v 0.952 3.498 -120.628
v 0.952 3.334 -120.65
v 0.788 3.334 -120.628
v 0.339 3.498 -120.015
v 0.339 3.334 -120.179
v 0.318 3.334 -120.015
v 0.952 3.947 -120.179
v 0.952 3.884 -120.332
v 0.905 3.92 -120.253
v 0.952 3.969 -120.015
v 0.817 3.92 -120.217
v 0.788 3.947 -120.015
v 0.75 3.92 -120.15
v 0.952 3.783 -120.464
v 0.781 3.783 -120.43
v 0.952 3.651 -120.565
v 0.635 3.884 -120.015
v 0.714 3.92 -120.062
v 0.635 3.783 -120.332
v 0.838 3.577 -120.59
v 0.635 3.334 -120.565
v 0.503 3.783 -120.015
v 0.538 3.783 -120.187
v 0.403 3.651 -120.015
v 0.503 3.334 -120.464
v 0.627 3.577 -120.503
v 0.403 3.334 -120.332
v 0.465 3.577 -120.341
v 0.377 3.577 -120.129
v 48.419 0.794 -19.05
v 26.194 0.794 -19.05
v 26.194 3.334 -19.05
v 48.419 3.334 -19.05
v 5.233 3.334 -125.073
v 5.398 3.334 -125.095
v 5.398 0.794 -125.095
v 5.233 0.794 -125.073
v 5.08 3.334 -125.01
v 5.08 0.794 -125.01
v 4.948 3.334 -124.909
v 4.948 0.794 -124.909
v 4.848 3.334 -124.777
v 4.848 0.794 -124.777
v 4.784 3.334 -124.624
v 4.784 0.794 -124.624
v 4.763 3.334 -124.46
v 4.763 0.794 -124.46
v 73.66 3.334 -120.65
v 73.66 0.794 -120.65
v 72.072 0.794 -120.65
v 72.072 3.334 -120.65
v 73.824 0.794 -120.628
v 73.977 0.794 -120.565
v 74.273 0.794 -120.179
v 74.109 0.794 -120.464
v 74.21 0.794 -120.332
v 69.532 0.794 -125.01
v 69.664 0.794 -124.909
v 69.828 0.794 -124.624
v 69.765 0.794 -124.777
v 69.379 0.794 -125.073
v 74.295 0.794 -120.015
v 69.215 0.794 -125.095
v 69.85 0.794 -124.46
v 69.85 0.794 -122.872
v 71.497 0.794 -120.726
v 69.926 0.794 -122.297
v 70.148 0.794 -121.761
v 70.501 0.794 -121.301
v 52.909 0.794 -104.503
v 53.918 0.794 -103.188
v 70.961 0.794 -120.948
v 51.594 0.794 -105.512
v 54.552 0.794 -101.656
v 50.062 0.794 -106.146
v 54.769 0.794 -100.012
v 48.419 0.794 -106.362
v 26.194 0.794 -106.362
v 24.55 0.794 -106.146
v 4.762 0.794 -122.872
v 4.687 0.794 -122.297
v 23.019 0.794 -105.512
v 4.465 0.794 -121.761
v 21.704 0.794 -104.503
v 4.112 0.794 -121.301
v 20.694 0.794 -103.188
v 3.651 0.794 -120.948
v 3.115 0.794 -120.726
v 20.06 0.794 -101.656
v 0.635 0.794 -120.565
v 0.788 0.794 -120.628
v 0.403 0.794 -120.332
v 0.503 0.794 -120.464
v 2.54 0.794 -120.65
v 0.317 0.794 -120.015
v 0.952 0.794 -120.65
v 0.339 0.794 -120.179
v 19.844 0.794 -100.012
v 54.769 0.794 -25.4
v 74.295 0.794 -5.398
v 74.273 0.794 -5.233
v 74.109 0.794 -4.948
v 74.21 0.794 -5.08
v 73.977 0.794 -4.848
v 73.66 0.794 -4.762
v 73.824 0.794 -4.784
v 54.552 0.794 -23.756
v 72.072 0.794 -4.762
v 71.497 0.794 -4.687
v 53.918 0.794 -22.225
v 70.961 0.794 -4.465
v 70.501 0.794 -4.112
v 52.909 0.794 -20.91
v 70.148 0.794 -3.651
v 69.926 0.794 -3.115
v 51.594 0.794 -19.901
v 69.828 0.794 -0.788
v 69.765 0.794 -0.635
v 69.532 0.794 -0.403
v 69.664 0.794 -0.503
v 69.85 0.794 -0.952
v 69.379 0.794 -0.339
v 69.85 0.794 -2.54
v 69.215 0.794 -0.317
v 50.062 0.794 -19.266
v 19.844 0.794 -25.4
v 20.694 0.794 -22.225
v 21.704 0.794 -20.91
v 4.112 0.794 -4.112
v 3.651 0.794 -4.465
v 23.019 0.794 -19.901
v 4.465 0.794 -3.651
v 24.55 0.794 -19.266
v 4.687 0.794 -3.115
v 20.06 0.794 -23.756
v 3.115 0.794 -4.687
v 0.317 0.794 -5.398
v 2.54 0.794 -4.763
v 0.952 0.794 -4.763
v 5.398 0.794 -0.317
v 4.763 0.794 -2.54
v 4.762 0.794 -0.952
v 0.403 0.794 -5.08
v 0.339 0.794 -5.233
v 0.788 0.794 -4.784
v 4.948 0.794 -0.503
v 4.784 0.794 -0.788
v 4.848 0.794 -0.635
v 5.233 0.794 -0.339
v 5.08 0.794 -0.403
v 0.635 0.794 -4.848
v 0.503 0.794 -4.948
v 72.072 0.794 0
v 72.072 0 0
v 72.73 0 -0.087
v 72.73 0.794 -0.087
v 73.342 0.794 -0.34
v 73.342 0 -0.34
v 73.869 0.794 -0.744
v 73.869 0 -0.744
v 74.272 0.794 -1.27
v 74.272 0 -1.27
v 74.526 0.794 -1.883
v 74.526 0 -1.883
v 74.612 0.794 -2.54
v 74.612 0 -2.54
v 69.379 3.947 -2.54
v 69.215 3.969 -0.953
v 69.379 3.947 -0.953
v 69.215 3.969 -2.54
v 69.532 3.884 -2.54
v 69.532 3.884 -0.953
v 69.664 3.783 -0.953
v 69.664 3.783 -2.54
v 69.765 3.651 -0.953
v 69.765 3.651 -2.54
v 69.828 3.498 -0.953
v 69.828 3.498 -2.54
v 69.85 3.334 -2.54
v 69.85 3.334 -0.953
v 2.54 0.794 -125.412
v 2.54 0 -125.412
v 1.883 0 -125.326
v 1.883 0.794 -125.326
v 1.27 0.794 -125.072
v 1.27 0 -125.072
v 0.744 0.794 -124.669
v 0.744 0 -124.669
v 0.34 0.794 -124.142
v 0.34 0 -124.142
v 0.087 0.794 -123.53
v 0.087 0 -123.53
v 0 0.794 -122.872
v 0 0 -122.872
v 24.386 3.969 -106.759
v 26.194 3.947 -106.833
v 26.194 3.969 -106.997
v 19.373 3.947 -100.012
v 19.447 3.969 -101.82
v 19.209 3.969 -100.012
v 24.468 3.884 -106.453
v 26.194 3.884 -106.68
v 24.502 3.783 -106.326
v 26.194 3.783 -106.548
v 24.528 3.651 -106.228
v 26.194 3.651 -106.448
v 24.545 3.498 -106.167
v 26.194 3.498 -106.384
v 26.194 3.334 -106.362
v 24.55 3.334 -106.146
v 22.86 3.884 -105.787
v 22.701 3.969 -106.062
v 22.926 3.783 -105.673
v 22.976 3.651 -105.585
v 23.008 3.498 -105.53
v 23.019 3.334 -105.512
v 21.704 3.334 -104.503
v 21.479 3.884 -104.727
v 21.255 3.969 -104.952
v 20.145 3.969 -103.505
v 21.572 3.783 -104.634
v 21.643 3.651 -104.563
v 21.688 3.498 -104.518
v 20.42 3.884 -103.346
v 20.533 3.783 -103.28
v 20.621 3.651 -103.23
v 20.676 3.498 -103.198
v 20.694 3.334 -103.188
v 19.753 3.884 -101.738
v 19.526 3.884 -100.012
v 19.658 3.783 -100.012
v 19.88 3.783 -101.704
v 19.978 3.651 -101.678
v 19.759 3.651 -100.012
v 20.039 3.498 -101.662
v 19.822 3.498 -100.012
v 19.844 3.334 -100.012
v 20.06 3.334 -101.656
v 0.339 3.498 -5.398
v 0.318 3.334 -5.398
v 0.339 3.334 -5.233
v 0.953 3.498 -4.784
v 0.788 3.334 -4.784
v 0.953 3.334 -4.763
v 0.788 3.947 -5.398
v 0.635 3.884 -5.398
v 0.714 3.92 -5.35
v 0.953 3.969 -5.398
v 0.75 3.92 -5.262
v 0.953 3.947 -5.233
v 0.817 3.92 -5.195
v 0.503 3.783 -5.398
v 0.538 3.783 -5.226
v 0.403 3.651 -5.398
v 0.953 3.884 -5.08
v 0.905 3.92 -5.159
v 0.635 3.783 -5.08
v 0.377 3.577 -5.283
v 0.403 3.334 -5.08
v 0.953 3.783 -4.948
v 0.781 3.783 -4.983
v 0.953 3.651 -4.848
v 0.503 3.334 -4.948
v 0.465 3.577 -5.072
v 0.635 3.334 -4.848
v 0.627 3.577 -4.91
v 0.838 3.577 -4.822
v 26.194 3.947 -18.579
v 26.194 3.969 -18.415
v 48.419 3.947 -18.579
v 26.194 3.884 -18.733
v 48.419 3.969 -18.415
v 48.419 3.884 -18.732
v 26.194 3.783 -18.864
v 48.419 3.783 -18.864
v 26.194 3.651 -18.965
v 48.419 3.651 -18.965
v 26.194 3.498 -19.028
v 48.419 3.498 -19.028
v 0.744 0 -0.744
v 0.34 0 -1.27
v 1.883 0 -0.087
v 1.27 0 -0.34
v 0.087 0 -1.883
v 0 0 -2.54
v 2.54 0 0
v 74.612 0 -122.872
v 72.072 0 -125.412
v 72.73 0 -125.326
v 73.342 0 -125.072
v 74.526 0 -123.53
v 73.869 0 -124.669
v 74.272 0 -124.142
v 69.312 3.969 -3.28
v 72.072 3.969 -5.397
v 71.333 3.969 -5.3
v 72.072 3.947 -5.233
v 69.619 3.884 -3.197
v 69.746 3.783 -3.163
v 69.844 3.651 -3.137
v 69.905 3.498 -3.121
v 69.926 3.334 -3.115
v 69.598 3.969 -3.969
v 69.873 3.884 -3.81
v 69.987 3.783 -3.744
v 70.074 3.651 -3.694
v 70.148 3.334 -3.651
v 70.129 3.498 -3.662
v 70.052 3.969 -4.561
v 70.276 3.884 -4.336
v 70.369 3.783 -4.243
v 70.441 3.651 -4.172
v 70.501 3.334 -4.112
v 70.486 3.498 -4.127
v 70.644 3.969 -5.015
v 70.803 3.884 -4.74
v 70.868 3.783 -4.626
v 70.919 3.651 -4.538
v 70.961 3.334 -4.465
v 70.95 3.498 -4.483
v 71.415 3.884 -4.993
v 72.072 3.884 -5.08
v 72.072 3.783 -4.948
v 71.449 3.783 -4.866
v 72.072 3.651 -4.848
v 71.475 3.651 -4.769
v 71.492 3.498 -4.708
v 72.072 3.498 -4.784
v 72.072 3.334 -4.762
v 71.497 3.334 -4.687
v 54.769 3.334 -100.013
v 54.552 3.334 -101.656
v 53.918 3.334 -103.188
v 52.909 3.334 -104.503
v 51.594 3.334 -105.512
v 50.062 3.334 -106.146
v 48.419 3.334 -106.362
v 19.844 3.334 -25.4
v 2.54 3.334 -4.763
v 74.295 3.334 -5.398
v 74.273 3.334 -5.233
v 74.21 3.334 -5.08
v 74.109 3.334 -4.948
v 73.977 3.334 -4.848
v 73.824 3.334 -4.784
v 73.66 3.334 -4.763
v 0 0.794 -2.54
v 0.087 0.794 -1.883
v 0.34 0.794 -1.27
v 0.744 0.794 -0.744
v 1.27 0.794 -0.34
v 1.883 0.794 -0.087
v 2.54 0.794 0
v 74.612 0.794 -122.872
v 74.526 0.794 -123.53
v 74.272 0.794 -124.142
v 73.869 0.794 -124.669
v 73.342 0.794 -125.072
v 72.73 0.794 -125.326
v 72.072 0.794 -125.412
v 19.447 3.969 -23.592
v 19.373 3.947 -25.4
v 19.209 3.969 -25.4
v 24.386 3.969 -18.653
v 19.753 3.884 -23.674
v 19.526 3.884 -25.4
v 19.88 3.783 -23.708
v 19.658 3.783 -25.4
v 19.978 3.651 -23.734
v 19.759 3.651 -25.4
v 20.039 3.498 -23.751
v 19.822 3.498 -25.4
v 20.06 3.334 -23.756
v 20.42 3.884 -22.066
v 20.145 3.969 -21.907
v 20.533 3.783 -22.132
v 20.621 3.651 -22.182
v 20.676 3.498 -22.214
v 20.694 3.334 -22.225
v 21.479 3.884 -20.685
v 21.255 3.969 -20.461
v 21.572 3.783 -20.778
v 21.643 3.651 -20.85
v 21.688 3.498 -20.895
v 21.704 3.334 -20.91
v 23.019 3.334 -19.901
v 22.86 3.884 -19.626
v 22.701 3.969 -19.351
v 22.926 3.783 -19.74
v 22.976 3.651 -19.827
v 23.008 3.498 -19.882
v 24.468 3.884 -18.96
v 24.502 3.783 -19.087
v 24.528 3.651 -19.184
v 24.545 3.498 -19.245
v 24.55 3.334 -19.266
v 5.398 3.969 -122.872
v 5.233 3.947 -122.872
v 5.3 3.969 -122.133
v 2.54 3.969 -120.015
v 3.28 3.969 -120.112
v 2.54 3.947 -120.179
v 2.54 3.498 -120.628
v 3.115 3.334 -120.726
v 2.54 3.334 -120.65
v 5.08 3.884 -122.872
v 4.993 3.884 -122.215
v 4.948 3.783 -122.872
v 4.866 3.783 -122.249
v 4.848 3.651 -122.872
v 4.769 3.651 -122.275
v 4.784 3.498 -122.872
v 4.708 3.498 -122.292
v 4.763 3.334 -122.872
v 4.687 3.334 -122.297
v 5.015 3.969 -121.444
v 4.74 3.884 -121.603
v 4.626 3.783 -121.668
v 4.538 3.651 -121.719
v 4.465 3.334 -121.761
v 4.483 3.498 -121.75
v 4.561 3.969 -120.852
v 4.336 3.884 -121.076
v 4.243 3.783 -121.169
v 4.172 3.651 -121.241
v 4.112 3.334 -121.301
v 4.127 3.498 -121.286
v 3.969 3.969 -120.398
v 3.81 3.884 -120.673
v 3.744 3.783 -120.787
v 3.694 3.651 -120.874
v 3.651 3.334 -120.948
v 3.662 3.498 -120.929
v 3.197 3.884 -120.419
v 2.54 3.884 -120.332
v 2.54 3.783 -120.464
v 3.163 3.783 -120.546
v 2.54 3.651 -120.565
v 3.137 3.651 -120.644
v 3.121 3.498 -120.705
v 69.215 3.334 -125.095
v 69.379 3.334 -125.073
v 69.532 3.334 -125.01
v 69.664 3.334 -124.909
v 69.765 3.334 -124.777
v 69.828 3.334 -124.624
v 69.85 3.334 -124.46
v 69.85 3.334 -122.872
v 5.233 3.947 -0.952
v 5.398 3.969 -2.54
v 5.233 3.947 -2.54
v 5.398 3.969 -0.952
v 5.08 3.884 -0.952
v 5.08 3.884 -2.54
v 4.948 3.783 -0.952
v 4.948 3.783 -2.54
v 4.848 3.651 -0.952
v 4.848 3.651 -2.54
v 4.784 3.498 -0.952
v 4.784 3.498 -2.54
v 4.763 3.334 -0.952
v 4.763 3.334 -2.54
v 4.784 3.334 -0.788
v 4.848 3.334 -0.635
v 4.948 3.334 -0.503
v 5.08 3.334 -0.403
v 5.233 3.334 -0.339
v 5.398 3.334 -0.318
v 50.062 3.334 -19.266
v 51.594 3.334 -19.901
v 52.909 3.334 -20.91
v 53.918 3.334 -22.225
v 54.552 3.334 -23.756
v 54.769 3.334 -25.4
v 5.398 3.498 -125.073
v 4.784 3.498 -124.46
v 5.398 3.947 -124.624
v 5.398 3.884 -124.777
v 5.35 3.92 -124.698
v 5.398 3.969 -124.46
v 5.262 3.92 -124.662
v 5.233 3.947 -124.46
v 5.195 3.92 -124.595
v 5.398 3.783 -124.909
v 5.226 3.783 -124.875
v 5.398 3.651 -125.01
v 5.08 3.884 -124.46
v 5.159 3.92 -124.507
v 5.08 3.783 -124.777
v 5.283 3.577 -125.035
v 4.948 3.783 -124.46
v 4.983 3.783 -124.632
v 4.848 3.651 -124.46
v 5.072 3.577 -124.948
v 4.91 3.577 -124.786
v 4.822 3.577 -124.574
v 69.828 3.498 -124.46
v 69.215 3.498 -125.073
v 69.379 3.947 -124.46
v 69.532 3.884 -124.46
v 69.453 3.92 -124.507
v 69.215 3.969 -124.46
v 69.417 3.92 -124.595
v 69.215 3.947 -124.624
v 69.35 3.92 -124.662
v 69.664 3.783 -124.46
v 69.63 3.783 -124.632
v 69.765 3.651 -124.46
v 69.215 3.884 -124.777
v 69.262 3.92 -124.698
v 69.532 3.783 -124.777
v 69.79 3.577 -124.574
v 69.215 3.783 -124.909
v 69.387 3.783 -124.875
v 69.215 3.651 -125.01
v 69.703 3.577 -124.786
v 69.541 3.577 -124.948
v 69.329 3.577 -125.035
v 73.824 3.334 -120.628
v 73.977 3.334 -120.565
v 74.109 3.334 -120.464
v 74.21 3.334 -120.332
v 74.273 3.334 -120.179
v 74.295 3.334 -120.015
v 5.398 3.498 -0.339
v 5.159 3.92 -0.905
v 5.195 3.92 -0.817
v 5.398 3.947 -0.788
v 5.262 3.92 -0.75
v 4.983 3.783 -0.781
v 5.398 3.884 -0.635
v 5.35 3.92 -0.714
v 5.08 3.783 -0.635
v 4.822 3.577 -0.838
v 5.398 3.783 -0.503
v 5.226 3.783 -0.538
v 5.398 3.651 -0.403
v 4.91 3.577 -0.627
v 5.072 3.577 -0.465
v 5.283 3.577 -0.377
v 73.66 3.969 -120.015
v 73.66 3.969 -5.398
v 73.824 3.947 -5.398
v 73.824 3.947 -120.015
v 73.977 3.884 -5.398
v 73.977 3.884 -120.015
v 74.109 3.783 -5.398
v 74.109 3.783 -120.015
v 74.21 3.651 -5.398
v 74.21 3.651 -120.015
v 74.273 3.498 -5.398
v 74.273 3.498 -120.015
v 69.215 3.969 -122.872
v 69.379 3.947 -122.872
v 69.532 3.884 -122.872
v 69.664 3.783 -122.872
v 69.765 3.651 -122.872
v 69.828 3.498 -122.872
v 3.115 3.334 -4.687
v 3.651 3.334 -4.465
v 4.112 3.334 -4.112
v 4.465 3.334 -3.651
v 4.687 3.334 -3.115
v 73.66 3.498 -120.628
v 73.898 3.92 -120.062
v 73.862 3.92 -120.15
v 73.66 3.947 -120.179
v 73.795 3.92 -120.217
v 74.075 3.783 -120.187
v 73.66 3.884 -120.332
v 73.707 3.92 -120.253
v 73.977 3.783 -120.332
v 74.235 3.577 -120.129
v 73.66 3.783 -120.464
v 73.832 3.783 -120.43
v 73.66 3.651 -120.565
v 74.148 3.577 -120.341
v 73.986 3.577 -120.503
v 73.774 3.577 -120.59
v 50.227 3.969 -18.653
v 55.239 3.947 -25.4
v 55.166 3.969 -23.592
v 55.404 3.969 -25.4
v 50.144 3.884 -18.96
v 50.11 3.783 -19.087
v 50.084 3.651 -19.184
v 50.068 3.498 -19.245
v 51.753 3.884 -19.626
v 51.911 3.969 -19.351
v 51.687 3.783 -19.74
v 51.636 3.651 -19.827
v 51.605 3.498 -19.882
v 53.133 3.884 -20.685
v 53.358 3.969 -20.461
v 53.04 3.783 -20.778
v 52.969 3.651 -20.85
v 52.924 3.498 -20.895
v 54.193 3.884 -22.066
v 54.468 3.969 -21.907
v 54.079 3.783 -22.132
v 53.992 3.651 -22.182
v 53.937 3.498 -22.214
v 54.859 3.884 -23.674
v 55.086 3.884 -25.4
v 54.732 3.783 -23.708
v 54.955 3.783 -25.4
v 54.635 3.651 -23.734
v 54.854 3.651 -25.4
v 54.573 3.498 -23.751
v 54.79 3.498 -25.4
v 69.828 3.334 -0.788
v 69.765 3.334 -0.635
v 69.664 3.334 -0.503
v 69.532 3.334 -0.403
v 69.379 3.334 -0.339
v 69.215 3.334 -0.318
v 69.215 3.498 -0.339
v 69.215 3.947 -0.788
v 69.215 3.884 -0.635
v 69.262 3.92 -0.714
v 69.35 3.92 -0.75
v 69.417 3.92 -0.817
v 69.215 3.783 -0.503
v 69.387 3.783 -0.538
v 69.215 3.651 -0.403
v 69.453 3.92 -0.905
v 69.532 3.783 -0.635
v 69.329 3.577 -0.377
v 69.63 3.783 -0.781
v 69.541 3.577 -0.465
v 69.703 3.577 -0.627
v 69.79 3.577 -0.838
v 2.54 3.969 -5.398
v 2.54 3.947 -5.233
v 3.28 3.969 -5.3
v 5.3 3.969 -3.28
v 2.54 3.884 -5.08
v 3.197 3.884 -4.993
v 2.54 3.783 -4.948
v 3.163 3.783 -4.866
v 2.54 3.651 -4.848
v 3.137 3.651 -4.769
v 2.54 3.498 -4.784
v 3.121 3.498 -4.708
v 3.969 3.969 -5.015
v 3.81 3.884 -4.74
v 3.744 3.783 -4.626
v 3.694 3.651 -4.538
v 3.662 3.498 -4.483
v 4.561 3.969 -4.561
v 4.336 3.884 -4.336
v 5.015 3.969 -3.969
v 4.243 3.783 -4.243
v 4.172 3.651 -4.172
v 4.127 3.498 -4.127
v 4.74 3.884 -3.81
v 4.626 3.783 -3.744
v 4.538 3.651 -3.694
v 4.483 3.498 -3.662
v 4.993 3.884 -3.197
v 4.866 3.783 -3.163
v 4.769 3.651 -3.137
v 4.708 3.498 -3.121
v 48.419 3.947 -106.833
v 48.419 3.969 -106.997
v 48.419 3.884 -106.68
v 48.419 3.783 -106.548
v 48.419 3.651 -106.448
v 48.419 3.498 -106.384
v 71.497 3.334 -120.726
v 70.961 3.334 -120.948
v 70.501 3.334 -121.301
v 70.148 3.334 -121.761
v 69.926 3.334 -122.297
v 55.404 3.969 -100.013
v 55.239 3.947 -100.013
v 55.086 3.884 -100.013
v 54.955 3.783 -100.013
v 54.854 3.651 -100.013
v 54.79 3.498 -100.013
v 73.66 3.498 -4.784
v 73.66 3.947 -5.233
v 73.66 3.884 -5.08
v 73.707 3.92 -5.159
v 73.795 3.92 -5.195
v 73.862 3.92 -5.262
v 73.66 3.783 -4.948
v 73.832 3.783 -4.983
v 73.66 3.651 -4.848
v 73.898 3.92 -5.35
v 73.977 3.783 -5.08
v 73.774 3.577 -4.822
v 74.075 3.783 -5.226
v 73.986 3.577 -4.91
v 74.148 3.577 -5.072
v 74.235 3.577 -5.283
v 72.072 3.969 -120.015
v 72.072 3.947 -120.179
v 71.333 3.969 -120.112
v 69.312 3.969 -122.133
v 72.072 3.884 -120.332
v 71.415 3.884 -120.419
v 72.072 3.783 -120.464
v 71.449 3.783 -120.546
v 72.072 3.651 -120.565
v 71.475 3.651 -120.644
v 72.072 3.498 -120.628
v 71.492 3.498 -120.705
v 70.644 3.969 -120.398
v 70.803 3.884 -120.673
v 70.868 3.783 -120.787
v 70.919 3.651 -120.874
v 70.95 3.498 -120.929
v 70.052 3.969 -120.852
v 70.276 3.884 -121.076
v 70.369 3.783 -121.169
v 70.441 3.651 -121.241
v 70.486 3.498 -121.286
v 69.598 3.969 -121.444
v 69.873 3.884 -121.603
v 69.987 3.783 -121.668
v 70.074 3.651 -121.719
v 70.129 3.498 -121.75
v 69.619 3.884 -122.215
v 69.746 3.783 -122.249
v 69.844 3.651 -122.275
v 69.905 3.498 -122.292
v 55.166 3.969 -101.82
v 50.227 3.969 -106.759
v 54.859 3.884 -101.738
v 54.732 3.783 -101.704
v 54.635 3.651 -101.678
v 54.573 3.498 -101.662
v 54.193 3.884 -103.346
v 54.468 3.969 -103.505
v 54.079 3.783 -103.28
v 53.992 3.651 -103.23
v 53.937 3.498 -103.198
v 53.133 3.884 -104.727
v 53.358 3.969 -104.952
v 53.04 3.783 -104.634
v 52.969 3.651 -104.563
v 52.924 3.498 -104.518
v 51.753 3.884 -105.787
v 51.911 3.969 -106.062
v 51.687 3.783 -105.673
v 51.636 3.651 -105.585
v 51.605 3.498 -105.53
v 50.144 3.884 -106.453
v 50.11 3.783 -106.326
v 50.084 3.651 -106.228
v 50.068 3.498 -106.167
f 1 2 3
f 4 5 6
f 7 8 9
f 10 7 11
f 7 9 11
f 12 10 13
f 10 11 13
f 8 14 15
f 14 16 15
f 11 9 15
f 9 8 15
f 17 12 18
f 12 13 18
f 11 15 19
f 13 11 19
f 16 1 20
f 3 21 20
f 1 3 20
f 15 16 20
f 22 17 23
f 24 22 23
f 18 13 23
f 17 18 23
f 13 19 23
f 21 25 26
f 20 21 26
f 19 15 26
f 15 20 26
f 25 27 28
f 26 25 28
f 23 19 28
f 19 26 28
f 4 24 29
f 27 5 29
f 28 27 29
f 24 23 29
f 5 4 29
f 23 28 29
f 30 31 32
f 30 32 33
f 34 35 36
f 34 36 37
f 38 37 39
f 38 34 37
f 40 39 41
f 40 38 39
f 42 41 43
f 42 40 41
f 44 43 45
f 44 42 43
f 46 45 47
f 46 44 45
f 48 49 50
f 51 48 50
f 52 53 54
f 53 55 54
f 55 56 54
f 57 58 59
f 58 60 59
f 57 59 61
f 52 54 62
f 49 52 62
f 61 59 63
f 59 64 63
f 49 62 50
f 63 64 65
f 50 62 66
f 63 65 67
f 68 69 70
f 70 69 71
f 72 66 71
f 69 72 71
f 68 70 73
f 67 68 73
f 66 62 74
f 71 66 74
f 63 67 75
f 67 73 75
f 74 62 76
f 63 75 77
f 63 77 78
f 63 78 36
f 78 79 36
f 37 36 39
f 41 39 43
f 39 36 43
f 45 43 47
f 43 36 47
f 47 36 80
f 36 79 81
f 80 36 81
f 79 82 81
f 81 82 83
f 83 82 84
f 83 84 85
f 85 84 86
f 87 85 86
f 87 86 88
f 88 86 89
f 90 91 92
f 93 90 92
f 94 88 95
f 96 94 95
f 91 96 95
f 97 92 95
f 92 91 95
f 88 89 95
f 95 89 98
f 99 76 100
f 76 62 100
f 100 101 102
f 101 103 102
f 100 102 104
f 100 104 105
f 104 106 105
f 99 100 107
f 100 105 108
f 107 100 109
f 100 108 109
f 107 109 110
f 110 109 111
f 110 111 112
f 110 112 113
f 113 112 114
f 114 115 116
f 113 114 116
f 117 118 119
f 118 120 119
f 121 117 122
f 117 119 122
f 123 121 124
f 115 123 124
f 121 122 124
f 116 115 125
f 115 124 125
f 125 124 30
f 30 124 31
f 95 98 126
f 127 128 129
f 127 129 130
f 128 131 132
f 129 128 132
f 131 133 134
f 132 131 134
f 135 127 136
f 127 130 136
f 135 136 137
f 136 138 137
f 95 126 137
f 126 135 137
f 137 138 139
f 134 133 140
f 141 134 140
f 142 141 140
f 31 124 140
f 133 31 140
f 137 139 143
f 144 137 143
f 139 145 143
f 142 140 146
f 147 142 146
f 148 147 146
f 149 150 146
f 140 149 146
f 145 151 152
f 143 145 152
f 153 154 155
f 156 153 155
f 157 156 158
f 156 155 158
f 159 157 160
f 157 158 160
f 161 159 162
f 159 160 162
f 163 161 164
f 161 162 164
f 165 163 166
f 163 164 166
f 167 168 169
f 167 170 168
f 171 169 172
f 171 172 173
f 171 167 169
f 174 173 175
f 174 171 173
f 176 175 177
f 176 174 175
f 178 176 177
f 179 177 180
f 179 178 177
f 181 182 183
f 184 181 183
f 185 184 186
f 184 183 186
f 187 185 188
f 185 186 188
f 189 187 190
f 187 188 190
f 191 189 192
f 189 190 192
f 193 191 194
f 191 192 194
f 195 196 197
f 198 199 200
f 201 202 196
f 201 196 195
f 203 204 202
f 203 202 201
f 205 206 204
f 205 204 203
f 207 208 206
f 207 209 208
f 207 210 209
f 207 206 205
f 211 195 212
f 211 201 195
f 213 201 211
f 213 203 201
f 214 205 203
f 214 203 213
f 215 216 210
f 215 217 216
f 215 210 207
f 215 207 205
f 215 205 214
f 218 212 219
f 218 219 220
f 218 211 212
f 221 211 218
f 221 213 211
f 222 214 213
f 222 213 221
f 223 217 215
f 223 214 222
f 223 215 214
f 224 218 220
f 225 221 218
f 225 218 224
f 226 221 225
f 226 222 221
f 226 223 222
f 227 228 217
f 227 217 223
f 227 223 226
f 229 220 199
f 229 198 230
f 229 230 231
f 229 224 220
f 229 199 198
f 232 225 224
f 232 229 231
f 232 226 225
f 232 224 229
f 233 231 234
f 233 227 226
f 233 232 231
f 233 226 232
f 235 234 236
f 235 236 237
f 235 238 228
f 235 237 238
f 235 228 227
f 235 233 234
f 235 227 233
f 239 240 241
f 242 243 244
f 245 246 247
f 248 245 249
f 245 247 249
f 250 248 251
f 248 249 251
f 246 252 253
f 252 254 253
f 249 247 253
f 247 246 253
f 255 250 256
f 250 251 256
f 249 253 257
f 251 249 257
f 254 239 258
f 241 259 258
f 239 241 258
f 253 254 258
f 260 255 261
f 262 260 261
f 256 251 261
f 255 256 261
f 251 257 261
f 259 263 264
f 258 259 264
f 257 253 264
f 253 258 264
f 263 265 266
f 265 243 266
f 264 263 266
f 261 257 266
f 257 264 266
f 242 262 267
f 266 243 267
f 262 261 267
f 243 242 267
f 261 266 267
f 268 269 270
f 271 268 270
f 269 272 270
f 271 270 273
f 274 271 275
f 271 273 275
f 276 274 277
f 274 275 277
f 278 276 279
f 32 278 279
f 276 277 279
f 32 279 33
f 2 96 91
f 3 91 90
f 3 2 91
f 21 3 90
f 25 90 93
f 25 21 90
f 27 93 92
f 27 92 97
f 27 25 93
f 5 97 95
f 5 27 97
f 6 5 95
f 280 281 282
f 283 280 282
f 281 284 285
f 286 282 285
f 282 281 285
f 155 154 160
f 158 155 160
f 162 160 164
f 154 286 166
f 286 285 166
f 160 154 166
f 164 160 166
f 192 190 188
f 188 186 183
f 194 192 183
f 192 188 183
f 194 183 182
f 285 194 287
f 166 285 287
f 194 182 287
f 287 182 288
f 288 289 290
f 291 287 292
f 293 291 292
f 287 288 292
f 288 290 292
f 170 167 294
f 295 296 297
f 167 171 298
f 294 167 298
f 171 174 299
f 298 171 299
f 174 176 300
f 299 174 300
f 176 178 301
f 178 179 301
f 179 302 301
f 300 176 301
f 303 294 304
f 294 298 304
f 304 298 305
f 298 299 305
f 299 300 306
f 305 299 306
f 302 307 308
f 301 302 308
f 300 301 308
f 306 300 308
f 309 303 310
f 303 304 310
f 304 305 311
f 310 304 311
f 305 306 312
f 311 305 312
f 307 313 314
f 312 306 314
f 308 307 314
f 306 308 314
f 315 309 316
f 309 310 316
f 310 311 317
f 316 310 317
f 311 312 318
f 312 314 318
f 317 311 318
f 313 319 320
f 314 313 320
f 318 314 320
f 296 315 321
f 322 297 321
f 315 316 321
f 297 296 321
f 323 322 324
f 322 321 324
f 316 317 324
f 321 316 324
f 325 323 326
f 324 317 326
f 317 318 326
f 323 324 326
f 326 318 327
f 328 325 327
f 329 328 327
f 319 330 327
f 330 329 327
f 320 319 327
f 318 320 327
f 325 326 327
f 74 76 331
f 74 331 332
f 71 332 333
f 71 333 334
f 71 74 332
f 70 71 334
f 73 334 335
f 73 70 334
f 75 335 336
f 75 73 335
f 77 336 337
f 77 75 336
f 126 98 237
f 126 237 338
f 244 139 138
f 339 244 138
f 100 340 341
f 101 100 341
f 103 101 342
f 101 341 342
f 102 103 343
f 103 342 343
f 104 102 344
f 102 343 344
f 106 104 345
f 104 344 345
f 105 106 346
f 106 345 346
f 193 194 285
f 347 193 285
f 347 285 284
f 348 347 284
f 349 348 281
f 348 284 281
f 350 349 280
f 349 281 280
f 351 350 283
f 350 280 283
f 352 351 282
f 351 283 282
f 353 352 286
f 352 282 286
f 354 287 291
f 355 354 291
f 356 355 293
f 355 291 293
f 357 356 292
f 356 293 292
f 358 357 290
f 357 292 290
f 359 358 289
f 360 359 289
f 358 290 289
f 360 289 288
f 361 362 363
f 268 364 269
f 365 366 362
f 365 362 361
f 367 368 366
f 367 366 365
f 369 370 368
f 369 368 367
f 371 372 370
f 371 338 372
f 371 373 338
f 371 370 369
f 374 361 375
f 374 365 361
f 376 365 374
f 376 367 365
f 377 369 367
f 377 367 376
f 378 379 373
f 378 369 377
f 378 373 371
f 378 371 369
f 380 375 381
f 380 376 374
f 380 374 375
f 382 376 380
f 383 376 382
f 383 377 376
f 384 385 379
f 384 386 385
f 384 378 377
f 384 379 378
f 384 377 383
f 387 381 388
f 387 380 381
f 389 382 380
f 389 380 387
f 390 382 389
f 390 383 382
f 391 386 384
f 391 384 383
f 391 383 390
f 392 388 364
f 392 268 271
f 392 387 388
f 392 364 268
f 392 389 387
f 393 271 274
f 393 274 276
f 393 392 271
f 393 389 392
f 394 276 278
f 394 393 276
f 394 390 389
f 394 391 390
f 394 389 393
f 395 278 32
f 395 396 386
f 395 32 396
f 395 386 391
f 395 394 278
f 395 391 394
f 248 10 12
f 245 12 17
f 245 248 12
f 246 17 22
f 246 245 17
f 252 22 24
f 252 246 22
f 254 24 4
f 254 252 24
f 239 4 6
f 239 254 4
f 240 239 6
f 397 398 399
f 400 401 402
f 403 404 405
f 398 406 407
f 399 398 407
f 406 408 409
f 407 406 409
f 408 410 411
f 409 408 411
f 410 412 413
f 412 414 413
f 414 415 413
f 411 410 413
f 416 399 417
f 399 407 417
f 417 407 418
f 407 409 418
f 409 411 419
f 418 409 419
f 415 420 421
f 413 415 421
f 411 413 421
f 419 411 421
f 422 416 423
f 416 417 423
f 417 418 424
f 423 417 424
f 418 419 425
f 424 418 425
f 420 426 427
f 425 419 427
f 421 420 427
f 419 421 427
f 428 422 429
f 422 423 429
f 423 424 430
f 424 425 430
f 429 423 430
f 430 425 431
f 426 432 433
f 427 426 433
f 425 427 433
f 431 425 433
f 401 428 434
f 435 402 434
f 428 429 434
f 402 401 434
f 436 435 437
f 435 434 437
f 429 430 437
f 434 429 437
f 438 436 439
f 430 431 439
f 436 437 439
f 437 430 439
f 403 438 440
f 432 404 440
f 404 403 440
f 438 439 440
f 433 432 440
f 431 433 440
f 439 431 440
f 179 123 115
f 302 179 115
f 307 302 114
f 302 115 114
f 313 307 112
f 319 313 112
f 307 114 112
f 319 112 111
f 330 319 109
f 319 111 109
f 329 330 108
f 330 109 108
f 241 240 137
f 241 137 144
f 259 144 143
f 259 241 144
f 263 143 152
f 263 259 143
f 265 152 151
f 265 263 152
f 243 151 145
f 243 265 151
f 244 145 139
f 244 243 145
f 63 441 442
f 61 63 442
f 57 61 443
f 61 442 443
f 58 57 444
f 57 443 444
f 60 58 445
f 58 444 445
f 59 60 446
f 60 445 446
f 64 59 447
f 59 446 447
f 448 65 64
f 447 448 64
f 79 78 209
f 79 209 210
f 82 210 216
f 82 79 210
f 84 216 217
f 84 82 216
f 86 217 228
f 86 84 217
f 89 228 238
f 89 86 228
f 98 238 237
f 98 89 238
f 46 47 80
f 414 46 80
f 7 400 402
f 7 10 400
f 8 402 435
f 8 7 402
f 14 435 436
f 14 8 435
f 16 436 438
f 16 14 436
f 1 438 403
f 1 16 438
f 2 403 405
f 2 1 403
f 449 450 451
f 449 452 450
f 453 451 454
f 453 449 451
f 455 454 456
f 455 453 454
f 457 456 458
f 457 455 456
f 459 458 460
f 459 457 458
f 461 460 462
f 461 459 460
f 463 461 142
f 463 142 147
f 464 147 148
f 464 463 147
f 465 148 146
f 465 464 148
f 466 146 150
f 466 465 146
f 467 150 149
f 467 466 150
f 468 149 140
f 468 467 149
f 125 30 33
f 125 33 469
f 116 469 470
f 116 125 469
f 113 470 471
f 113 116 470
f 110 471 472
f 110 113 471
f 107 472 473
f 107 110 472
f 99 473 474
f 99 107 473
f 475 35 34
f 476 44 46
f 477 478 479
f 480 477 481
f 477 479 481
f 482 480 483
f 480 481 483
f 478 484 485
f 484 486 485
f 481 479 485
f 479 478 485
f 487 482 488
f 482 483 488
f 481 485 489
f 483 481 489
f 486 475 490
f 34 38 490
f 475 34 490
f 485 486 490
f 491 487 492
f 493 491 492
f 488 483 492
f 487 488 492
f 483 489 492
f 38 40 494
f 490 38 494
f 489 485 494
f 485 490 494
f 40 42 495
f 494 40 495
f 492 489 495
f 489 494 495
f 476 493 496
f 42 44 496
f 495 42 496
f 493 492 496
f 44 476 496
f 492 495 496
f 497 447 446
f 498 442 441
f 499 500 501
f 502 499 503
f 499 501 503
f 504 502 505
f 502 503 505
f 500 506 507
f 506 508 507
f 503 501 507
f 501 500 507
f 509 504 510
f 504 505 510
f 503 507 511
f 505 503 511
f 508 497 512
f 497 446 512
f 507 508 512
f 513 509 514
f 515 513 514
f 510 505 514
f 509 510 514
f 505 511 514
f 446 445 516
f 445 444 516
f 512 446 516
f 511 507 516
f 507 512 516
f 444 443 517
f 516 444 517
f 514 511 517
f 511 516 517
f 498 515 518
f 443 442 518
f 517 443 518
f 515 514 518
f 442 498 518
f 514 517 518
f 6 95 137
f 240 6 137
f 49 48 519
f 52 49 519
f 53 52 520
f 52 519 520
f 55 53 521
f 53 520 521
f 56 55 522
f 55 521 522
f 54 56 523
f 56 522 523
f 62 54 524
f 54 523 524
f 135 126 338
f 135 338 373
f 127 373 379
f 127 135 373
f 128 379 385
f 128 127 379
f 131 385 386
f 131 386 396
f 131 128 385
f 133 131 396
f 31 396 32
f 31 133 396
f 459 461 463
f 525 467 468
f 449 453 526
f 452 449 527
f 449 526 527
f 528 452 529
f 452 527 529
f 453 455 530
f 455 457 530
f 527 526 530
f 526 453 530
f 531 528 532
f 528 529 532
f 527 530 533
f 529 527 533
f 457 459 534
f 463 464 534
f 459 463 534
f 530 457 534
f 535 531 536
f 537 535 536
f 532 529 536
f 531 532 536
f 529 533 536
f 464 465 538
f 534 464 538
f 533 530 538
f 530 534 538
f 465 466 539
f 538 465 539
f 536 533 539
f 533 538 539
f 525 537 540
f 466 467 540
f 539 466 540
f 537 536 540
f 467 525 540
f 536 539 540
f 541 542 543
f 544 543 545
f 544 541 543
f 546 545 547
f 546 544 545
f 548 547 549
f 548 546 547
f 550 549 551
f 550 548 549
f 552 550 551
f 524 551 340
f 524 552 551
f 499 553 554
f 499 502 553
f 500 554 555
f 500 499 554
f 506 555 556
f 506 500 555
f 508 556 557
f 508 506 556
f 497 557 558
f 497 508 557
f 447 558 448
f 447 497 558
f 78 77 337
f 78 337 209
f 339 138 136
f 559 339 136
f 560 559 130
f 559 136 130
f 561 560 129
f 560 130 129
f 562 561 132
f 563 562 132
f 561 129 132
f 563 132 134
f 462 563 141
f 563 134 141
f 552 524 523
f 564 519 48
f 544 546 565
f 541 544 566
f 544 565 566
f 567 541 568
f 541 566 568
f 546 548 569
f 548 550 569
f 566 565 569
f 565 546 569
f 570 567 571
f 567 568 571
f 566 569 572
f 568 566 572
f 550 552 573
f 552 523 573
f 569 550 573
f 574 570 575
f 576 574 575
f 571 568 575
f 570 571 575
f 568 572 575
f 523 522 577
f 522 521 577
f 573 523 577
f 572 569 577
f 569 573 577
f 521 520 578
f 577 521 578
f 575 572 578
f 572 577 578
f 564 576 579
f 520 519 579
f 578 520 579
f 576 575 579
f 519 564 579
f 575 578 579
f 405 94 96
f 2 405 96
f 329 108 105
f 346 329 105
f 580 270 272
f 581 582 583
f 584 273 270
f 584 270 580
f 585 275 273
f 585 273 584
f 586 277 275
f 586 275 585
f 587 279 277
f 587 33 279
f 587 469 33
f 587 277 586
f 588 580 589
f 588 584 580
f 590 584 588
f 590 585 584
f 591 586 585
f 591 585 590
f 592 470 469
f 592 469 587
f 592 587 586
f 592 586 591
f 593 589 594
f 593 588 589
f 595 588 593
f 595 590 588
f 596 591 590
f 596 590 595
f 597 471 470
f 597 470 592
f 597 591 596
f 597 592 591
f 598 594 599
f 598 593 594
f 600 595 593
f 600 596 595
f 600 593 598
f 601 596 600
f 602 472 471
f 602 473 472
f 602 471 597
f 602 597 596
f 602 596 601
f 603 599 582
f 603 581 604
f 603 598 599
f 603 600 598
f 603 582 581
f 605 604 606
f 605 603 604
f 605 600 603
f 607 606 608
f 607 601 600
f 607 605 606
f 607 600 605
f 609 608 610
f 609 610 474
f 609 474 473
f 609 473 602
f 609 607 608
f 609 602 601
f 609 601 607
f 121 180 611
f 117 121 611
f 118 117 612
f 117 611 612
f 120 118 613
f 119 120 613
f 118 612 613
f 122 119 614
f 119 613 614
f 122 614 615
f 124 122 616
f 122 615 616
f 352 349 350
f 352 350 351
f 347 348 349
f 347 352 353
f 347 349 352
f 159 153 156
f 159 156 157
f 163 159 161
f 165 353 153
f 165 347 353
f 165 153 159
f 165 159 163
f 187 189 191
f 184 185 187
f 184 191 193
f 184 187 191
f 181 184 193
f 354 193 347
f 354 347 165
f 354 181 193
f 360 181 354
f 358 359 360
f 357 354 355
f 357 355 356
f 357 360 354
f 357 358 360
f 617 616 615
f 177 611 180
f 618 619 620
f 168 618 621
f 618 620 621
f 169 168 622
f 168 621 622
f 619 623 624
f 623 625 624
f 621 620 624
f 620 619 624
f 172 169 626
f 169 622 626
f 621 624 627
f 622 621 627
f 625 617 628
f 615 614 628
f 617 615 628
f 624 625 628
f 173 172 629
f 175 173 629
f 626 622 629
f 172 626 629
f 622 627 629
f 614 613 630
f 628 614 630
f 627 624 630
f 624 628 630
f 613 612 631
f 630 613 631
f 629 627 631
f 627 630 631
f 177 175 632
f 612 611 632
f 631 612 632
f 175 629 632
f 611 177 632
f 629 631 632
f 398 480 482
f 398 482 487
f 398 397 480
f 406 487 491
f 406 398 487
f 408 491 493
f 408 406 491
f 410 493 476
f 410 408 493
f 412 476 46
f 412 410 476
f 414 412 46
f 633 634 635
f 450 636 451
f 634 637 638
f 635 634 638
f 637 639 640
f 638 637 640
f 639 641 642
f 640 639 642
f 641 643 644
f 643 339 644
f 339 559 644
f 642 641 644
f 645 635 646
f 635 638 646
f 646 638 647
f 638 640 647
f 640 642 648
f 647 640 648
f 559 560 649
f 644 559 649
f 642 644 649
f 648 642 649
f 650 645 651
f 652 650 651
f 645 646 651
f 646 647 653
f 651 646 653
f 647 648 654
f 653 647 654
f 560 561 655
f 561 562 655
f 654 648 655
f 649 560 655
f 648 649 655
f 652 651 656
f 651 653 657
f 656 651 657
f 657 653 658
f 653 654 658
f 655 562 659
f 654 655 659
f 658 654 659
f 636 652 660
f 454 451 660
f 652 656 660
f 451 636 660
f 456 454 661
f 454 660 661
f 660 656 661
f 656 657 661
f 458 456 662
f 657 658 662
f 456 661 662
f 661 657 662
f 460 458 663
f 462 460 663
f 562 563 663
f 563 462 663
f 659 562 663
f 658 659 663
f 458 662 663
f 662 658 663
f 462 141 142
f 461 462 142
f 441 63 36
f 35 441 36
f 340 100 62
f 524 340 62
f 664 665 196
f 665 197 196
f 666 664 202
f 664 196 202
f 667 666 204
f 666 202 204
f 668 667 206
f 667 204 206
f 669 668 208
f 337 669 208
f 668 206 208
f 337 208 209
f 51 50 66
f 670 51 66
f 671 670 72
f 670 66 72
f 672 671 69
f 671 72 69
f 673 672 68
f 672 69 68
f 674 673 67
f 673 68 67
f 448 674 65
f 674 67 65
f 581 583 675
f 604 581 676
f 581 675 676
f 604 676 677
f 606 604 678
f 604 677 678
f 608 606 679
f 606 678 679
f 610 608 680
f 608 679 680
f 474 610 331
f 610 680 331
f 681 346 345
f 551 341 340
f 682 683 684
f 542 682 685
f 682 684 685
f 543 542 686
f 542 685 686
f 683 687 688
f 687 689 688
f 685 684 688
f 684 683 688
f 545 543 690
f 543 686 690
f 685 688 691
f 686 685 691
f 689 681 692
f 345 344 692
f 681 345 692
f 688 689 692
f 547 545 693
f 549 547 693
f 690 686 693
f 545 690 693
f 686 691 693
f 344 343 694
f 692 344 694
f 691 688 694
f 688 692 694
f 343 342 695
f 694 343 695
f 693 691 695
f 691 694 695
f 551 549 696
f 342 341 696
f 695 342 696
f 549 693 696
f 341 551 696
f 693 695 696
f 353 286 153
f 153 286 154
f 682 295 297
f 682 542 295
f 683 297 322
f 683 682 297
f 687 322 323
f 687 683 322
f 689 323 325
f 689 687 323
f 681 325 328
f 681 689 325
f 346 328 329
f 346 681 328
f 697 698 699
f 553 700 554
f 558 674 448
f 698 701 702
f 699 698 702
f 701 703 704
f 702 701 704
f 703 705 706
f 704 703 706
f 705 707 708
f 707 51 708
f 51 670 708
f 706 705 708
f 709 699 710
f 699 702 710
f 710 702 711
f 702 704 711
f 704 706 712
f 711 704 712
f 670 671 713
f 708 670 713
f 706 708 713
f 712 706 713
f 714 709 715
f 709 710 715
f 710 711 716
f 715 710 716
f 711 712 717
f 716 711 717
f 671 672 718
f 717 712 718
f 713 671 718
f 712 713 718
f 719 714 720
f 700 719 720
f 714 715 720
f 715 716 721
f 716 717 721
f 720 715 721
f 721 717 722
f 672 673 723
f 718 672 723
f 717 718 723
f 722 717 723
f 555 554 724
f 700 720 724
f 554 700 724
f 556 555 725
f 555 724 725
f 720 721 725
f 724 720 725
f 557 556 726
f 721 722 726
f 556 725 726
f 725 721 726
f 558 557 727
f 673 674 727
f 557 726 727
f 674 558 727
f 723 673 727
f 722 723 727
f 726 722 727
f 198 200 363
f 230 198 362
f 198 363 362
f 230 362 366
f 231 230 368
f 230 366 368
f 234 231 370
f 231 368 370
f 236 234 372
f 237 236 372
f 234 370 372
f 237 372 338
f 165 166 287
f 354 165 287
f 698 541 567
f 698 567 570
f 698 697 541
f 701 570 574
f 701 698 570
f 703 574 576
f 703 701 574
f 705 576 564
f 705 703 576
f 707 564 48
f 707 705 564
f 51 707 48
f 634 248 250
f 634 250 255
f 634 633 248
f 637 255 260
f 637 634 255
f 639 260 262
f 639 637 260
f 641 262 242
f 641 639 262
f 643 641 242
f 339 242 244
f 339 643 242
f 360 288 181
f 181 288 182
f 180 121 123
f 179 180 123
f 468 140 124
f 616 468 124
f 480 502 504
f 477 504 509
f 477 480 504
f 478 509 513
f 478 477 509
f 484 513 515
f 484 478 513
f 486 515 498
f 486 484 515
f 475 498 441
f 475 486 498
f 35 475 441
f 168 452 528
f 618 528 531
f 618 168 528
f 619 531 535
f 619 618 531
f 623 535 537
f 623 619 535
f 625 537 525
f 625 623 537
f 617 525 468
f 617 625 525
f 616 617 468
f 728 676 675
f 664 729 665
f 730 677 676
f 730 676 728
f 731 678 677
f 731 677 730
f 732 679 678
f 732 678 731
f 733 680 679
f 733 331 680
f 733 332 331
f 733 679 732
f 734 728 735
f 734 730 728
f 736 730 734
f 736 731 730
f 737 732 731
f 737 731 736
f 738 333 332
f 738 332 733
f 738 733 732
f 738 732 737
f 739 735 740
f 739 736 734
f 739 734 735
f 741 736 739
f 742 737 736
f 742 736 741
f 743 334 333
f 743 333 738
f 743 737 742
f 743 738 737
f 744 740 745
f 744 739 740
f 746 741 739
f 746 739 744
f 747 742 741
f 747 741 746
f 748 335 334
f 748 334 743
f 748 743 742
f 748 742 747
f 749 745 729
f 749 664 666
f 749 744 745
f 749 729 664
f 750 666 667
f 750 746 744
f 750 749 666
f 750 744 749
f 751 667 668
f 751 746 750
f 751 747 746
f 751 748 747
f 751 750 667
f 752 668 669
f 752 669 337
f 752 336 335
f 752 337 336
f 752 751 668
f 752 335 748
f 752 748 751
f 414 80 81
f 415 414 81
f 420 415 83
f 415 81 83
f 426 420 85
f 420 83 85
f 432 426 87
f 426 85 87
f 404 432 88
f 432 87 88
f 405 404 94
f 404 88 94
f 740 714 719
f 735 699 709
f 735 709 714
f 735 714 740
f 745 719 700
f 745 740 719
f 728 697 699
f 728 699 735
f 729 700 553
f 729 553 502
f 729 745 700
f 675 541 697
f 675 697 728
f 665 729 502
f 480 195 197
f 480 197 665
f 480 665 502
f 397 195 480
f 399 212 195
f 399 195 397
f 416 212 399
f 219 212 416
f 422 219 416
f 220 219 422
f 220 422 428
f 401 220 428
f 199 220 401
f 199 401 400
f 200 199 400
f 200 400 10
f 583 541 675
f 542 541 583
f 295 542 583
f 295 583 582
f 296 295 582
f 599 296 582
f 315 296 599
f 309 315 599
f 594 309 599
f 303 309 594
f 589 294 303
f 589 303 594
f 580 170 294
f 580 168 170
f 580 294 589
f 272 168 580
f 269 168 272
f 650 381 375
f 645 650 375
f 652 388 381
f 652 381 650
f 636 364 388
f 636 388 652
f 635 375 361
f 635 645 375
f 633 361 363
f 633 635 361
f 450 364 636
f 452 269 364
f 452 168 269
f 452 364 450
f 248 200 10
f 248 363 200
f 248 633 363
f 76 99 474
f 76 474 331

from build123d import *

# Parameters (mm, degrees)
BASE_FLANGE1_DEPTH = 0.79375
EXTRUDE1_DEPTH     = 3.175
FILLET1_R          = 0.635
FILLET2_R          = 0.635


# Sheet-metal steps are written as plain solids
with BuildPart() as part:
    # Sketch1 → Base-Flange1 (new body)
    with BuildSketch(Plane(origin=(0, 0, 0), x_dir=(1, 0, 0), z_dir=(0, 1, 0))):
        with BuildLine():
            Line((2.54, 0), (72.0725, 0))
            ThreePointArc((72.0725, 0), (73.868551224, 0.743948776), (74.6125, 2.54))
            Line((74.6125, 2.54), (74.6125, 122.8725))
            ThreePointArc((74.6125, 122.8725), (73.868551224, 124.668551224), (72.0725, 125.4125))
            Line((72.0725, 125.4125), (2.54, 125.4125))
            ThreePointArc((2.54, 125.4125), (0.743948776, 124.668551224), (0, 122.8725))
            Line((0, 122.8725), (0, 2.54))
            ThreePointArc((0, 2.54), (0.743948776, 0.743948776), (2.54, 0))
        make_face()
    extrude(amount=BASE_FLANGE1_DEPTH)


with BuildPart() as body_2:
    # Sketch3 → Extrude1 (new body)
    with BuildSketch(Plane(origin=(0, 0.79375, 0), x_dir=(-1, 0, 0), z_dir=(0, 1, 0))):
        with BuildLine():
            Line((-69.85, -125.095), (-4.7625, -125.095))
            Line((-4.7625, -125.095), (-4.7625, -122.8725))
            ThreePointArc((-4.7625, -122.8725), (-4.111544821, -121.300955179), (-2.54, -120.65))
            Line((-2.54, -120.65), (-0.3175, -120.65))
            Line((-0.3175, -120.65), (-0.3175, -4.7625))
            Line((-0.3175, -4.7625), (-2.54, -4.7625))
            ThreePointArc((-2.54, -4.7625), (-4.111544821, -4.111544821), (-4.7625, -2.54))
            Line((-4.7625, -2.54), (-4.7625, -0.3175))
            Line((-4.7625, -0.3175), (-69.85, -0.3175))
            Line((-69.85, -0.3175), (-69.85, -2.54))
            ThreePointArc((-69.85, -2.54), (-70.500955179, -4.111544821), (-72.0725, -4.7625))
            Line((-72.0725, -4.7625), (-74.295, -4.7625))
            Line((-74.295, -4.7625), (-74.295, -120.65))
            Line((-74.295, -120.65), (-72.0725, -120.65))
            ThreePointArc((-72.0725, -120.65), (-70.500955179, -121.300955179), (-69.85, -122.8725))
            Line((-69.85, -122.8725), (-69.85, -125.095))
        make_face()
        with BuildLine():
            Line((-26.19375, -19.05), (-48.41875, -19.05))
            ThreePointArc((-48.41875, -19.05), (-52.908878061, -20.909871939), (-54.76875, -25.4))
            Line((-54.76875, -25.4), (-54.76875, -100.0125))
            ThreePointArc((-54.76875, -100.0125), (-52.908878061, -104.502628061), (-48.41875, -106.3625))
            Line((-48.41875, -106.3625), (-26.19375, -106.3625))
            ThreePointArc((-26.19375, -106.3625), (-21.703621939, -104.502628061), (-19.84375, -100.0125))
            Line((-19.84375, -100.0125), (-19.84375, -25.4))
            ThreePointArc((-19.84375, -25.4), (-21.703621939, -20.909871939), (-26.19375, -19.05))
        make_face(mode=Mode.SUBTRACT)
    extrude(amount=EXTRUDE1_DEPTH)

    # Fillet1
    fillet1_edges = [body_2.edges().sort_by_distance(p)[0] for p in [
        (0.3175, 2.38125, -4.7625),
        (0.3175, 2.38125, -120.65),
        (4.7625, 2.38125, -125.095),
        (69.85, 2.38125, -125.095),
        (74.295, 2.38125, -120.65),
        (74.295, 2.38125, -4.7625),
        (69.85, 2.38125, -0.3175),
        (4.7625, 2.38125, -0.3175),
    ]]
    fillet(fillet1_edges, radius=FILLET1_R)

    # Fillet2
    fillet2_edges = [body_2.edges().sort_by_distance(p)[0] for p in [
        (70.500955179, 3.96875, -4.111544821),
        (72.86625, 3.96875, -4.7625),
        (70.500955179, 3.96875, -121.300955179),
        (69.85, 3.96875, -123.66625),
        (4.111544821, 3.96875, -4.111544821),
        (4.111544821, 3.96875, -121.300955179),
        (1.74625, 3.96875, -120.65),
        (21.703621939, 3.96875, -104.502628061),
        (19.84375, 3.96875, -62.70625),
        (21.703621939, 3.96875, -20.909871939),
        (37.30625, 3.96875, -19.05),
        (52.908878061, 3.96875, -20.909871939),
        (54.76875, 3.96875, -62.70625),
        (52.908878061, 3.96875, -104.502628061),
        (37.30625, 3.96875, -106.3625),
        (4.7625, 3.96875, -1.74625),
        (1.74625, 3.96875, -4.7625),
        (0.3175, 3.96875, -62.70625),
        (37.30625, 3.96875, -0.3175),
        (69.85, 3.96875, -1.74625),
        (74.295, 3.96875, -62.70625),
        (72.86625, 3.96875, -120.65),
        (37.30625, 3.96875, -125.095),
        (4.7625, 3.96875, -123.66625),
        (4.948487194, 3.96875, -124.909012806),
        (0.503487194, 3.96875, -120.464012806),
        (69.664012806, 3.96875, -124.909012806),
        (74.109012806, 3.96875, -120.464012806),
        (74.109012806, 3.96875, -4.948487194),
        (69.664012806, 3.96875, -0.503487194),
        (4.948487194, 3.96875, -0.503487194),
        (0.503487194, 3.96875, -4.948487194),
    ]]
    fillet(fillet2_edges, radius=FILLET2_R)


solid = Compound([part.part, body_2.part])
